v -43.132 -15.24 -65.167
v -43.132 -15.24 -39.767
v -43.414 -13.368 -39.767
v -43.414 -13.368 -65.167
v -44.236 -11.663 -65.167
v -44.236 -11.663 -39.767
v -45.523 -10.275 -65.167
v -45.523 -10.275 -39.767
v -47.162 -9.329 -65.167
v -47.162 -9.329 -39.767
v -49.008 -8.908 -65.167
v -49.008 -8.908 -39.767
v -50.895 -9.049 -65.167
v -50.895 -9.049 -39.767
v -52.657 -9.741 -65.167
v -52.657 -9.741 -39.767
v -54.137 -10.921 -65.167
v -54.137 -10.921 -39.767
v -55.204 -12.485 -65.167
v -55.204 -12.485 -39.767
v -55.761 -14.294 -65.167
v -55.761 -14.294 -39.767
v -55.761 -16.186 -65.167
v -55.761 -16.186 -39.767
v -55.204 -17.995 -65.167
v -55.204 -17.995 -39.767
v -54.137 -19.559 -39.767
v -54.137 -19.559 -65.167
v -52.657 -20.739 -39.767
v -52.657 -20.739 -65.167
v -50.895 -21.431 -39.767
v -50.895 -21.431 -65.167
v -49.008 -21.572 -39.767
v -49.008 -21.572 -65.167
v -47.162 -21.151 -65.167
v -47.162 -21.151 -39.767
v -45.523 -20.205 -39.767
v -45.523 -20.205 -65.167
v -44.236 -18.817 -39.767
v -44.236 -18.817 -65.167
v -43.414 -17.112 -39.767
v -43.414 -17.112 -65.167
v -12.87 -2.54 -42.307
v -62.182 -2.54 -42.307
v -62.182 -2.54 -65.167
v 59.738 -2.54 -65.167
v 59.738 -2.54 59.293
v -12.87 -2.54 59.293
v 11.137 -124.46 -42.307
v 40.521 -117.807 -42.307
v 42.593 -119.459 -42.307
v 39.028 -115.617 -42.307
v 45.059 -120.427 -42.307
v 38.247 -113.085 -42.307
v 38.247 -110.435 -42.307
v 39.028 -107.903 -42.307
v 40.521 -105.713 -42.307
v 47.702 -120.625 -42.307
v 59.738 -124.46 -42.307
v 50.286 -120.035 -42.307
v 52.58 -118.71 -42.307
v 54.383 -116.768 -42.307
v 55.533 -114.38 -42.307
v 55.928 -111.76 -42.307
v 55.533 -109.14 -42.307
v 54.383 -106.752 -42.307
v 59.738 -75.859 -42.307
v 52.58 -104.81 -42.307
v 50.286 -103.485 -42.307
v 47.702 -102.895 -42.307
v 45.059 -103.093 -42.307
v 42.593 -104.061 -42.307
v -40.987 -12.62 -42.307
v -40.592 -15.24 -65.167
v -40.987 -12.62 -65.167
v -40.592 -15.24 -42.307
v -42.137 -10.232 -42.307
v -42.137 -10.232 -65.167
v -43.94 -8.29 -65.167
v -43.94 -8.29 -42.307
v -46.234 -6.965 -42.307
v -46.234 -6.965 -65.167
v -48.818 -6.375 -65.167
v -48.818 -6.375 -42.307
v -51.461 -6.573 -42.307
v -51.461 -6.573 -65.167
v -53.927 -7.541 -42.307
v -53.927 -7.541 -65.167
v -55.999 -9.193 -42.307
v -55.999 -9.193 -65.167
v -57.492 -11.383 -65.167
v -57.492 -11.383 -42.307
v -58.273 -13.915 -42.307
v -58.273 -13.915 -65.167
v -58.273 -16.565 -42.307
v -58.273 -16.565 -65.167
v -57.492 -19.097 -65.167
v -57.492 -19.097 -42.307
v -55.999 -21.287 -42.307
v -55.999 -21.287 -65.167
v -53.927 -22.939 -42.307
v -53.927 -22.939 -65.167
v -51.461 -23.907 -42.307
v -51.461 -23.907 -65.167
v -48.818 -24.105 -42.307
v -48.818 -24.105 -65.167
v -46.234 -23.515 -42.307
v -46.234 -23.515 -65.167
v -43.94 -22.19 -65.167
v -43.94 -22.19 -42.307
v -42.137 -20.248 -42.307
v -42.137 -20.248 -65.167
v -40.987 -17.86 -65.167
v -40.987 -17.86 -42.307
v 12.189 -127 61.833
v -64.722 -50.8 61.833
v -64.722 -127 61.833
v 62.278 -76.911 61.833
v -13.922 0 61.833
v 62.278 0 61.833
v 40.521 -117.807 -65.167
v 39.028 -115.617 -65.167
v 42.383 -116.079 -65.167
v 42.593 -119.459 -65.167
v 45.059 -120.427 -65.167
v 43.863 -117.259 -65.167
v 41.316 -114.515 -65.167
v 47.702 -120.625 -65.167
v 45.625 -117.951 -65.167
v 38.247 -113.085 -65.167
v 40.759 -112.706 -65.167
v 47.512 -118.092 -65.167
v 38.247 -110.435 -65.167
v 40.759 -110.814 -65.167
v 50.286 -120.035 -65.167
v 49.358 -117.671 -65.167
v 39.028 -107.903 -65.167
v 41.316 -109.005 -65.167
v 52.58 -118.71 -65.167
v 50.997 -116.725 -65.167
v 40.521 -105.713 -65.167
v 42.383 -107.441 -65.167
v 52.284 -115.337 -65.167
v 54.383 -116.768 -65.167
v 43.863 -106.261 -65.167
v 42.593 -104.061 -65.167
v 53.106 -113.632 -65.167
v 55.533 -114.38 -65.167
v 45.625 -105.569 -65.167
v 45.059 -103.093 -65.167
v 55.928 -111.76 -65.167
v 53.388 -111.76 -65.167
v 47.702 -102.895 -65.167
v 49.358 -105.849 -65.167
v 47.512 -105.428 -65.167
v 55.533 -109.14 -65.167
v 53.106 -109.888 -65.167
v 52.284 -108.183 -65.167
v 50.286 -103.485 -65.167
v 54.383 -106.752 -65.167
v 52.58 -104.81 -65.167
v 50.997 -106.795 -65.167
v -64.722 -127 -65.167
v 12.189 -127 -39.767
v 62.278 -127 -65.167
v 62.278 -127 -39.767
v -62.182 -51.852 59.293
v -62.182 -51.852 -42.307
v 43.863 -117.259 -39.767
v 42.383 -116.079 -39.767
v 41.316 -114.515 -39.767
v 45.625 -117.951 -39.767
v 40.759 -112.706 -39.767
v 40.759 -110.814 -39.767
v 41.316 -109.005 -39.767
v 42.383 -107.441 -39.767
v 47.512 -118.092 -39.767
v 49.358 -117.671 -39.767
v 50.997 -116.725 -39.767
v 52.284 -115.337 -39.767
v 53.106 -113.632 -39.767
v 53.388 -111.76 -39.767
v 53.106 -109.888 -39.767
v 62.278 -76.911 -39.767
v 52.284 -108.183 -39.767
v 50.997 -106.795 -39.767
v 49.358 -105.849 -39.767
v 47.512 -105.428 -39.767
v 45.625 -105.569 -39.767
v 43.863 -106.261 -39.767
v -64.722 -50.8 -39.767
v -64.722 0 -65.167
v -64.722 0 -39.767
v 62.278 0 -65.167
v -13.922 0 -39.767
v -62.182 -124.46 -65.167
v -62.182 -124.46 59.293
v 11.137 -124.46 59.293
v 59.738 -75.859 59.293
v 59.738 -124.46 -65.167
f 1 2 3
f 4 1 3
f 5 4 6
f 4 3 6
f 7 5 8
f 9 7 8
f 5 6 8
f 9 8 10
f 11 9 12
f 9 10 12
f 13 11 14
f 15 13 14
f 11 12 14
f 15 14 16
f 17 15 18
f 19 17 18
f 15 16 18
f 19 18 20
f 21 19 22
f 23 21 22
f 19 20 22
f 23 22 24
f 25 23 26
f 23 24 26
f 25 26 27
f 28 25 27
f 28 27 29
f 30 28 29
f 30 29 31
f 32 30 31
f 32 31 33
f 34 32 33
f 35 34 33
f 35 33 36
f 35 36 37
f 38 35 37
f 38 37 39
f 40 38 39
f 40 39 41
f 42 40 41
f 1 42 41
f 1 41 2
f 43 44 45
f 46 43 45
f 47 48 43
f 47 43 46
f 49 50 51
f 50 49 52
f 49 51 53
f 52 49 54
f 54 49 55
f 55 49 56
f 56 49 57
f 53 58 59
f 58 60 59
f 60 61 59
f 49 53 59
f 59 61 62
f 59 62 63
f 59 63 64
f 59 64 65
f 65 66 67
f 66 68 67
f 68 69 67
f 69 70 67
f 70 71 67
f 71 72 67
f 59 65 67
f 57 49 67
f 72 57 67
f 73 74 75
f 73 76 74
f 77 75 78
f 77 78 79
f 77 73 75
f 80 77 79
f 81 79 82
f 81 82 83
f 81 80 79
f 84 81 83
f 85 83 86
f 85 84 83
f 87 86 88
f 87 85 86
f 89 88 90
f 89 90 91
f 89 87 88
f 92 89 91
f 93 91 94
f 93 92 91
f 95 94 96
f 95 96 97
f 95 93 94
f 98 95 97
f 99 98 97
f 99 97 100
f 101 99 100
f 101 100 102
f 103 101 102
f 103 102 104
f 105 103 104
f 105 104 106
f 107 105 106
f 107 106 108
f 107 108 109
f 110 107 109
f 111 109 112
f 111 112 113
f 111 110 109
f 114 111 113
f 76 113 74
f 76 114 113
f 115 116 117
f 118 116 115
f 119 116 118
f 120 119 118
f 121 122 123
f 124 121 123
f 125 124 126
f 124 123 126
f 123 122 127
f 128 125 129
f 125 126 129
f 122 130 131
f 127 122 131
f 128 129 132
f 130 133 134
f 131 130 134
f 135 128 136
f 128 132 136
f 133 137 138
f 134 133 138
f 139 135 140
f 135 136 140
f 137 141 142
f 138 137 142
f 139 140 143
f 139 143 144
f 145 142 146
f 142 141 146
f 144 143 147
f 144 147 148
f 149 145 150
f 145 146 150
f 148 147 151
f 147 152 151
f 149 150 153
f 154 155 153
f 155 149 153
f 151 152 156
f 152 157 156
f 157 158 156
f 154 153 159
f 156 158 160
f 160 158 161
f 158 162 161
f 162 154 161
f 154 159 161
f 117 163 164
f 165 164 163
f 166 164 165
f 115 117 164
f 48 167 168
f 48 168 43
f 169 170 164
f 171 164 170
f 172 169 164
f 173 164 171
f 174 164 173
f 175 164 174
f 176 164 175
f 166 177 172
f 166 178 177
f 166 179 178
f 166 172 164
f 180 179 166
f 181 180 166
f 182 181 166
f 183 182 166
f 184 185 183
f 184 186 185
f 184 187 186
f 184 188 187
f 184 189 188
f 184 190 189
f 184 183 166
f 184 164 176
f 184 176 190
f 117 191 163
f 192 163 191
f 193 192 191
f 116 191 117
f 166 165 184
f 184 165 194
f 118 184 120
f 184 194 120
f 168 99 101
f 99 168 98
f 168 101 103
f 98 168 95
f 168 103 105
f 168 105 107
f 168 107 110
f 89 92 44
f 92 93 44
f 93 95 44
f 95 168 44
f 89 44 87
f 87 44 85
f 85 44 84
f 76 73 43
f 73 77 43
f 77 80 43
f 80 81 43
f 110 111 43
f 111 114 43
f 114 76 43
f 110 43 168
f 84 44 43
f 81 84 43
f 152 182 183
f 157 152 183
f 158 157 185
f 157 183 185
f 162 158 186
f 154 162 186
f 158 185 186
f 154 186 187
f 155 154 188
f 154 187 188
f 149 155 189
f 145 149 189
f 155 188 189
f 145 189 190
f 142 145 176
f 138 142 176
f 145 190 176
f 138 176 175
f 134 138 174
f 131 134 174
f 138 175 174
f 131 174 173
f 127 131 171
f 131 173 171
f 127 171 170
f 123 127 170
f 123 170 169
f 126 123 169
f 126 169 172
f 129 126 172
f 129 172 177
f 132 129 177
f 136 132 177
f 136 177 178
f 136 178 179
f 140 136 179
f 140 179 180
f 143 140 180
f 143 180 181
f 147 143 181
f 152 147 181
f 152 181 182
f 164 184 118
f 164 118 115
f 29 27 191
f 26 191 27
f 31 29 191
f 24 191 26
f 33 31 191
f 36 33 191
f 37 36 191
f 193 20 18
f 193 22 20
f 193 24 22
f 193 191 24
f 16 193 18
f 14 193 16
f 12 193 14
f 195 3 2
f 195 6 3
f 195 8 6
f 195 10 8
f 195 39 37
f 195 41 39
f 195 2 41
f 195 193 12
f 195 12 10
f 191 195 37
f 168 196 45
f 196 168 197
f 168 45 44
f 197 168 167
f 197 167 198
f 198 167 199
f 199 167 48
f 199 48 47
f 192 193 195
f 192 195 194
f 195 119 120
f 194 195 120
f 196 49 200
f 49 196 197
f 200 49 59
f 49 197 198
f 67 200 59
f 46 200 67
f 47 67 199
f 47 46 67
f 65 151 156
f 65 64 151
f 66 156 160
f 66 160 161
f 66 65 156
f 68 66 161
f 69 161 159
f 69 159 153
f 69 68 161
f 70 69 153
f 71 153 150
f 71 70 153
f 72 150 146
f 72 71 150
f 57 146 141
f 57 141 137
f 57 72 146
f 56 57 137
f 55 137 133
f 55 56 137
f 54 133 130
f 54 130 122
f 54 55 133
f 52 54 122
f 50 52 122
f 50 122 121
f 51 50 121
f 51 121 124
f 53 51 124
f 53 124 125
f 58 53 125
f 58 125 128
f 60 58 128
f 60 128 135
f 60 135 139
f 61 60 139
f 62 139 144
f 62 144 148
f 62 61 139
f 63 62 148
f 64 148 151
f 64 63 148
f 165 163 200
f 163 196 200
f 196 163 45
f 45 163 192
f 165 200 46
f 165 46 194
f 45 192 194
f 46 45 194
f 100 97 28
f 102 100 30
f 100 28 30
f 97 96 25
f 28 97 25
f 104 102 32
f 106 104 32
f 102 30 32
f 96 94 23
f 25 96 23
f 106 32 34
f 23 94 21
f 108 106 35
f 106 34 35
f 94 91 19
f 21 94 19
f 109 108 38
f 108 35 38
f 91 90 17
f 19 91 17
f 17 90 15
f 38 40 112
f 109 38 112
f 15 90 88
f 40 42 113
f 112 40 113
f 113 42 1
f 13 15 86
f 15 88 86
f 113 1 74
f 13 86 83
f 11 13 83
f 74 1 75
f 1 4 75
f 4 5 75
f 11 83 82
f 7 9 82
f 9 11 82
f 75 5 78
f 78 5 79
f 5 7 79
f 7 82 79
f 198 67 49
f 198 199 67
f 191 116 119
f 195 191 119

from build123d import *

# Parameters (mm, degrees)
F0_W     = 127
F0_H     = 127
F1_DEPTH = 127
F4_DEPTH = 101.6
F5_R     = 6.35
F6_DEPTH = 203.2
F7_T     = -2.54


with BuildPart() as f1:
    # F0 (on Front) → F1 (new body)
    with BuildSketch(Plane.XZ):
        with Locations((-1.222377643, -1.6671840248)):
            Rectangle(F0_W, F0_H)
    extrude(amount=F1_DEPTH)

    # F3 (on face) + F2 (on face) → F4 (cut)
    with BuildSketch(Plane.XY.offset(61.8328159752)):
        Polygon((62.8832024596, -127.1058379948), (62.8832024596, -76.3058379948), (12.0832024596, -127.1058379948), align=None)
    with BuildSketch(Plane.XY.offset(61.8328159752)):
        Polygon((-13.922377643, 0), (-64.722377643, 0), (-64.722377643, -50.8), align=None)
    extrude(amount=-F4_DEPTH, mode=Mode.SUBTRACT)

    # F5 (on face) → F6 (cut)
    with BuildSketch(Plane.XY.offset(-39.7671840248)):
        with Locations((-49.482377643, -15.24)):
            Circle(F5_R)
        with Locations((47.037622357, -111.76)):
            Circle(F5_R)
    extrude(amount=-F6_DEPTH, mode=Mode.SUBTRACT)

    # F7
    f7_openings = [f1.faces().sort_by_distance(p)[0] for p in [
        (-1.222378, -63.5, -65.167184),
    ]]
    offset(amount=F7_T, openings=f7_openings, kind=Kind.INTERSECTION)


solid = f1.part
